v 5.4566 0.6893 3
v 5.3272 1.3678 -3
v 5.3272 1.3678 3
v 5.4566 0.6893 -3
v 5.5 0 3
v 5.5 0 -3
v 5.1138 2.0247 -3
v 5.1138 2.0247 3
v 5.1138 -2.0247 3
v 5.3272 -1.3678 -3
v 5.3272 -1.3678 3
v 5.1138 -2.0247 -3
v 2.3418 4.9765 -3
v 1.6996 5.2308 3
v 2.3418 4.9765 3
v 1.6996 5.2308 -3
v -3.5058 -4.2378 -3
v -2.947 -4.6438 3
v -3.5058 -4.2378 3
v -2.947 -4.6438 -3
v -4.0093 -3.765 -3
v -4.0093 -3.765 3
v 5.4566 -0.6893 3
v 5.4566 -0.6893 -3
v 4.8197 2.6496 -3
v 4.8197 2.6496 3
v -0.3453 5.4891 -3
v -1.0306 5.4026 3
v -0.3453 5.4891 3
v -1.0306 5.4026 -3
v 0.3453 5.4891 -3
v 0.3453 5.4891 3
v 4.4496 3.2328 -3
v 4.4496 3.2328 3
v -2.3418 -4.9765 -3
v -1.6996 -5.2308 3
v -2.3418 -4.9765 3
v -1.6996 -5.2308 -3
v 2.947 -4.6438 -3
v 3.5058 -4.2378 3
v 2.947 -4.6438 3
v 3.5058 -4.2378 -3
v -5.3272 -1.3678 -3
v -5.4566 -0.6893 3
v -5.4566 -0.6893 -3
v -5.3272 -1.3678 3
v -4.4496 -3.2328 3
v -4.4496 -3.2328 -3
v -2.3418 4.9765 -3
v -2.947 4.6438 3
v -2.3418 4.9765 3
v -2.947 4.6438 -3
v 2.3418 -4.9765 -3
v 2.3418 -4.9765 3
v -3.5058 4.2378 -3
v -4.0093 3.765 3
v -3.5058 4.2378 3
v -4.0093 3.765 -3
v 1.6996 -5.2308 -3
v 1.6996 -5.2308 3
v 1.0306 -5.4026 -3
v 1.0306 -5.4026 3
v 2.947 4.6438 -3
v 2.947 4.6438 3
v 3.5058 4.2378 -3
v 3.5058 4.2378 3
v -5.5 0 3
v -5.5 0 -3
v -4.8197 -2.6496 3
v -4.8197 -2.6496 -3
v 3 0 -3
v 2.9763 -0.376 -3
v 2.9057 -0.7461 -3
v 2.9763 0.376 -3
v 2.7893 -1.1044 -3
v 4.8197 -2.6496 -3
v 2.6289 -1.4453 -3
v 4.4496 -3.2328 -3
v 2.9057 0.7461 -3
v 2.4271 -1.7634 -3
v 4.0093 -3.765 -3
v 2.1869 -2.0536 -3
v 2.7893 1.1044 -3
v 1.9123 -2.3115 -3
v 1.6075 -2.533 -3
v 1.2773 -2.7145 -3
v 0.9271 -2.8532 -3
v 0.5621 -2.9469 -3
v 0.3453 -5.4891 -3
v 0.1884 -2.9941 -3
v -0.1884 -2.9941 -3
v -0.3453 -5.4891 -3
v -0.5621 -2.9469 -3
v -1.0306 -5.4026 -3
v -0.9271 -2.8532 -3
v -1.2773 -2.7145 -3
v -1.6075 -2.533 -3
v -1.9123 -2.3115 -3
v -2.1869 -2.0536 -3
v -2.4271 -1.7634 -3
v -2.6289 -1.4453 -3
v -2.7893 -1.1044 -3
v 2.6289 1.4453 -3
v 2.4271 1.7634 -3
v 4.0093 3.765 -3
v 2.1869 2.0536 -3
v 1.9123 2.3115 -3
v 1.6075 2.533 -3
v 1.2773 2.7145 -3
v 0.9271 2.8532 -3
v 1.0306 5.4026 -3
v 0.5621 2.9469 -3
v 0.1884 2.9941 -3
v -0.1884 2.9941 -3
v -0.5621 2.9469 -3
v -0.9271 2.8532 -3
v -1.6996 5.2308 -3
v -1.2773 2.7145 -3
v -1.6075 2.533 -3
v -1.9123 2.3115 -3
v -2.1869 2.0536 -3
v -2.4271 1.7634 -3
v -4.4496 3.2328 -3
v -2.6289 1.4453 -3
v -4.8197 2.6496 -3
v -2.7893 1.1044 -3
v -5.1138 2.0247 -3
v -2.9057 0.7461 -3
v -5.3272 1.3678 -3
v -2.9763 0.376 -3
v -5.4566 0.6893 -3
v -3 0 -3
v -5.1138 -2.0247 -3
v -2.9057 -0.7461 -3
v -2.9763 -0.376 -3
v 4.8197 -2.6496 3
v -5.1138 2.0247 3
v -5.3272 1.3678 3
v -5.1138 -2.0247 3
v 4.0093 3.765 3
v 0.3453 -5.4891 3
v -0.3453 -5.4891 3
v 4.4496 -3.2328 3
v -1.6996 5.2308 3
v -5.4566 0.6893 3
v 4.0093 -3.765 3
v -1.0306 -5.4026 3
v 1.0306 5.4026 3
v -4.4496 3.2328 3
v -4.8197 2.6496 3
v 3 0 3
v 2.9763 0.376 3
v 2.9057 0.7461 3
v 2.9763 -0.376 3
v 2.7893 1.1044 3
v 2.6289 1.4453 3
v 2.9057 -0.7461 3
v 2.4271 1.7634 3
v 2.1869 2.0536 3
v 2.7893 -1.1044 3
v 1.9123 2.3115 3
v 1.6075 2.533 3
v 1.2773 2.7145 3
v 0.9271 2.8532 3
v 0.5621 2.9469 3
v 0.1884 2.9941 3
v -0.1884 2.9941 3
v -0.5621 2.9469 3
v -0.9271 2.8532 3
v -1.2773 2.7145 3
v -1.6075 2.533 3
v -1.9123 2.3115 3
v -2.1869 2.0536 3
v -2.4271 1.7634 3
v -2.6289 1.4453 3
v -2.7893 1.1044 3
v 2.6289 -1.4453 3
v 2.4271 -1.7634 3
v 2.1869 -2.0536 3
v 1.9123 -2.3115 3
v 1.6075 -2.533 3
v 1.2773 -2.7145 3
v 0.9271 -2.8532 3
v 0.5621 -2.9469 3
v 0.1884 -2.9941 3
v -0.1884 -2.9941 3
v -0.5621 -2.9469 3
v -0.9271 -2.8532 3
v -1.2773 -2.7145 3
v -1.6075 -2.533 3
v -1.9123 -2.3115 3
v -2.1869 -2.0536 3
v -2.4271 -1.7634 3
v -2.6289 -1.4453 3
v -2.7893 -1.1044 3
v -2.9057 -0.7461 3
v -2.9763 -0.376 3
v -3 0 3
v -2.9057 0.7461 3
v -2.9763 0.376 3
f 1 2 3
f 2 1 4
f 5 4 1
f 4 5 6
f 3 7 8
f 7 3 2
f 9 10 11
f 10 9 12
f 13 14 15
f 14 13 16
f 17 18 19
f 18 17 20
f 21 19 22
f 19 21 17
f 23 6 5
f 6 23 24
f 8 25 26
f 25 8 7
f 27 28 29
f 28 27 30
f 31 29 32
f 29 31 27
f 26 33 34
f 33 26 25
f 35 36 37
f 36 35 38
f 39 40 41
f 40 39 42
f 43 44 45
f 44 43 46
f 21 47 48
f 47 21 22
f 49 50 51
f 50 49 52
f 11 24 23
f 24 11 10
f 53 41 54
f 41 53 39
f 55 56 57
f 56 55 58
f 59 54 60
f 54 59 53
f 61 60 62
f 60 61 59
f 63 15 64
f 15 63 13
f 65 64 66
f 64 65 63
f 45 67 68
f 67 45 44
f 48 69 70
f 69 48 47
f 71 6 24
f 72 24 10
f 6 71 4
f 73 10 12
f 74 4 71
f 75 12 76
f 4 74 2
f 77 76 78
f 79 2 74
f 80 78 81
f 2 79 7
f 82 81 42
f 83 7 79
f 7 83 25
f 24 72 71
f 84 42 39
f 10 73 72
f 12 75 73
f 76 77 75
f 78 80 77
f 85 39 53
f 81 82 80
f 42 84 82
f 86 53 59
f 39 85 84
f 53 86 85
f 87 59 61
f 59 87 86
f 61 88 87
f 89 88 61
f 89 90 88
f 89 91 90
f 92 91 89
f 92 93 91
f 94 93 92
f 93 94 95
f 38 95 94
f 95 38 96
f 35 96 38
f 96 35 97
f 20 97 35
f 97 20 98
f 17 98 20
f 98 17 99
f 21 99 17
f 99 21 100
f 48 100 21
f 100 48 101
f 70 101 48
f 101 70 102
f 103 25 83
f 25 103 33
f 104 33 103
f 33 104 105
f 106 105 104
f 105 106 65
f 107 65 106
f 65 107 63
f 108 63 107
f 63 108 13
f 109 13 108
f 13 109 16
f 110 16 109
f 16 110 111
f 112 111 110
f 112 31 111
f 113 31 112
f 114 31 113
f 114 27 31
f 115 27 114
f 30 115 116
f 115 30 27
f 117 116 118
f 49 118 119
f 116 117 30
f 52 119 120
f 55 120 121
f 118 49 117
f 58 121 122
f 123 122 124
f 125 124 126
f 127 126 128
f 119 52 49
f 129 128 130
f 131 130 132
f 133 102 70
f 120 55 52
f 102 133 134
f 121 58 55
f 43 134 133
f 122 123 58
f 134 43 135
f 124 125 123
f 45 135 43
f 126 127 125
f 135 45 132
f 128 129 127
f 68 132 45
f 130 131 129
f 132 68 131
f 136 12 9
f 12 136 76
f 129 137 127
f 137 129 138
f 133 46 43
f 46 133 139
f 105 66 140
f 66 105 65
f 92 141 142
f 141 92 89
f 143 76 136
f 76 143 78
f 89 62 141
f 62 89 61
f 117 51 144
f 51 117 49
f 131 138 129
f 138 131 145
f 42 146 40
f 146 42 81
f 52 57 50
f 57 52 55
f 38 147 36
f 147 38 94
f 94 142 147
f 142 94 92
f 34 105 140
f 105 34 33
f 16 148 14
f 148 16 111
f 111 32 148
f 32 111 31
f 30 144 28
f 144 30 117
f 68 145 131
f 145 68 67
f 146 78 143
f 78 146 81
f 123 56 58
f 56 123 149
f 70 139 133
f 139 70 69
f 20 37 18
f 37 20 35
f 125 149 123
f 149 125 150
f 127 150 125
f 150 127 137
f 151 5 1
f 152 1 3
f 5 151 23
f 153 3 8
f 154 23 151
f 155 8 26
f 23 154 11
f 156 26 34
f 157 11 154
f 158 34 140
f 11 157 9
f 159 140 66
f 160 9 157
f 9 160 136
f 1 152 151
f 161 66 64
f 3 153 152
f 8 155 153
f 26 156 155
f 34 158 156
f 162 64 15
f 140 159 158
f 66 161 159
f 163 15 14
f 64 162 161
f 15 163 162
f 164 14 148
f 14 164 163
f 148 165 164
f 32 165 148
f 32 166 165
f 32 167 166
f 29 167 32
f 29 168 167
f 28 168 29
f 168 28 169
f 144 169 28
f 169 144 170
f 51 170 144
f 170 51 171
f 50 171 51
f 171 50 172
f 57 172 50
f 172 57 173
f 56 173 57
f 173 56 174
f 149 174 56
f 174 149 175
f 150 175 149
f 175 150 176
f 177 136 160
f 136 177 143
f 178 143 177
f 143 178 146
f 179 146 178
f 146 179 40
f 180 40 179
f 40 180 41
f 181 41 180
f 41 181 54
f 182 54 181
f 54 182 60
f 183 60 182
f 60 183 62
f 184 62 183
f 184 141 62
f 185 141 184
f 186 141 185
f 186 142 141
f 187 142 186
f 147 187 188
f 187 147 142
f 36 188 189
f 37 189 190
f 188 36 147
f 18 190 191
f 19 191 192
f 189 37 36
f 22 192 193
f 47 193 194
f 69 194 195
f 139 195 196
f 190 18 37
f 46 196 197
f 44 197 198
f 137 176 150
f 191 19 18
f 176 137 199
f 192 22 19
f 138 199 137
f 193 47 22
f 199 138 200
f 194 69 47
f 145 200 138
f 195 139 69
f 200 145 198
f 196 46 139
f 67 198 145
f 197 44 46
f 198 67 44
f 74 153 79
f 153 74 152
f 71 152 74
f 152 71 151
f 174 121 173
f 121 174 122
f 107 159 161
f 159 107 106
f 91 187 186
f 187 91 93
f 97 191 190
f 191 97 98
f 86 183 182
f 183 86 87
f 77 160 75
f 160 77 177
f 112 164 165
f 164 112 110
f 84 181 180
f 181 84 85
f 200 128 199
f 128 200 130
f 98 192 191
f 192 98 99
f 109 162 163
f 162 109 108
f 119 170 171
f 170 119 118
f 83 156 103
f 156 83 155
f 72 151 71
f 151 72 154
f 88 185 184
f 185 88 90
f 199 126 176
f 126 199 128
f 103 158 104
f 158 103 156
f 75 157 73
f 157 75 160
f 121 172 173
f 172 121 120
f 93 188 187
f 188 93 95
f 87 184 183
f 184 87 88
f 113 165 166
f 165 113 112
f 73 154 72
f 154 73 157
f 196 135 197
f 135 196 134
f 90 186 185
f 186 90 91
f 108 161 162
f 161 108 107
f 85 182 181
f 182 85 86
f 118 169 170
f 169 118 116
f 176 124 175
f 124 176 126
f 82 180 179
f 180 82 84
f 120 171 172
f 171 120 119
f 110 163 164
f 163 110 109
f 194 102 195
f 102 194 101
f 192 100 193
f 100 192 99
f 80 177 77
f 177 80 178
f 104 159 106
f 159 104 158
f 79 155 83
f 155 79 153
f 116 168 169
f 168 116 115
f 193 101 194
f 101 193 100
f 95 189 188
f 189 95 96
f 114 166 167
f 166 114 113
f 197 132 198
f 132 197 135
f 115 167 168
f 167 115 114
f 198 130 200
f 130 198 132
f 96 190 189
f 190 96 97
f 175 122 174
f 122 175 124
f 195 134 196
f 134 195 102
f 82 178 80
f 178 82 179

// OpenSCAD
$fn = 50;


difference() {
	union() {
		translate(v = [0, 0, -3.0000000000]) {
			cylinder(h = 6, r = 5.5000000000);
		}
	}
	union() {
		translate(v = [0, 0, -100.0000000000]) {
			cylinder(h = 200, r = 3.0000000000);
		}
	}
}
